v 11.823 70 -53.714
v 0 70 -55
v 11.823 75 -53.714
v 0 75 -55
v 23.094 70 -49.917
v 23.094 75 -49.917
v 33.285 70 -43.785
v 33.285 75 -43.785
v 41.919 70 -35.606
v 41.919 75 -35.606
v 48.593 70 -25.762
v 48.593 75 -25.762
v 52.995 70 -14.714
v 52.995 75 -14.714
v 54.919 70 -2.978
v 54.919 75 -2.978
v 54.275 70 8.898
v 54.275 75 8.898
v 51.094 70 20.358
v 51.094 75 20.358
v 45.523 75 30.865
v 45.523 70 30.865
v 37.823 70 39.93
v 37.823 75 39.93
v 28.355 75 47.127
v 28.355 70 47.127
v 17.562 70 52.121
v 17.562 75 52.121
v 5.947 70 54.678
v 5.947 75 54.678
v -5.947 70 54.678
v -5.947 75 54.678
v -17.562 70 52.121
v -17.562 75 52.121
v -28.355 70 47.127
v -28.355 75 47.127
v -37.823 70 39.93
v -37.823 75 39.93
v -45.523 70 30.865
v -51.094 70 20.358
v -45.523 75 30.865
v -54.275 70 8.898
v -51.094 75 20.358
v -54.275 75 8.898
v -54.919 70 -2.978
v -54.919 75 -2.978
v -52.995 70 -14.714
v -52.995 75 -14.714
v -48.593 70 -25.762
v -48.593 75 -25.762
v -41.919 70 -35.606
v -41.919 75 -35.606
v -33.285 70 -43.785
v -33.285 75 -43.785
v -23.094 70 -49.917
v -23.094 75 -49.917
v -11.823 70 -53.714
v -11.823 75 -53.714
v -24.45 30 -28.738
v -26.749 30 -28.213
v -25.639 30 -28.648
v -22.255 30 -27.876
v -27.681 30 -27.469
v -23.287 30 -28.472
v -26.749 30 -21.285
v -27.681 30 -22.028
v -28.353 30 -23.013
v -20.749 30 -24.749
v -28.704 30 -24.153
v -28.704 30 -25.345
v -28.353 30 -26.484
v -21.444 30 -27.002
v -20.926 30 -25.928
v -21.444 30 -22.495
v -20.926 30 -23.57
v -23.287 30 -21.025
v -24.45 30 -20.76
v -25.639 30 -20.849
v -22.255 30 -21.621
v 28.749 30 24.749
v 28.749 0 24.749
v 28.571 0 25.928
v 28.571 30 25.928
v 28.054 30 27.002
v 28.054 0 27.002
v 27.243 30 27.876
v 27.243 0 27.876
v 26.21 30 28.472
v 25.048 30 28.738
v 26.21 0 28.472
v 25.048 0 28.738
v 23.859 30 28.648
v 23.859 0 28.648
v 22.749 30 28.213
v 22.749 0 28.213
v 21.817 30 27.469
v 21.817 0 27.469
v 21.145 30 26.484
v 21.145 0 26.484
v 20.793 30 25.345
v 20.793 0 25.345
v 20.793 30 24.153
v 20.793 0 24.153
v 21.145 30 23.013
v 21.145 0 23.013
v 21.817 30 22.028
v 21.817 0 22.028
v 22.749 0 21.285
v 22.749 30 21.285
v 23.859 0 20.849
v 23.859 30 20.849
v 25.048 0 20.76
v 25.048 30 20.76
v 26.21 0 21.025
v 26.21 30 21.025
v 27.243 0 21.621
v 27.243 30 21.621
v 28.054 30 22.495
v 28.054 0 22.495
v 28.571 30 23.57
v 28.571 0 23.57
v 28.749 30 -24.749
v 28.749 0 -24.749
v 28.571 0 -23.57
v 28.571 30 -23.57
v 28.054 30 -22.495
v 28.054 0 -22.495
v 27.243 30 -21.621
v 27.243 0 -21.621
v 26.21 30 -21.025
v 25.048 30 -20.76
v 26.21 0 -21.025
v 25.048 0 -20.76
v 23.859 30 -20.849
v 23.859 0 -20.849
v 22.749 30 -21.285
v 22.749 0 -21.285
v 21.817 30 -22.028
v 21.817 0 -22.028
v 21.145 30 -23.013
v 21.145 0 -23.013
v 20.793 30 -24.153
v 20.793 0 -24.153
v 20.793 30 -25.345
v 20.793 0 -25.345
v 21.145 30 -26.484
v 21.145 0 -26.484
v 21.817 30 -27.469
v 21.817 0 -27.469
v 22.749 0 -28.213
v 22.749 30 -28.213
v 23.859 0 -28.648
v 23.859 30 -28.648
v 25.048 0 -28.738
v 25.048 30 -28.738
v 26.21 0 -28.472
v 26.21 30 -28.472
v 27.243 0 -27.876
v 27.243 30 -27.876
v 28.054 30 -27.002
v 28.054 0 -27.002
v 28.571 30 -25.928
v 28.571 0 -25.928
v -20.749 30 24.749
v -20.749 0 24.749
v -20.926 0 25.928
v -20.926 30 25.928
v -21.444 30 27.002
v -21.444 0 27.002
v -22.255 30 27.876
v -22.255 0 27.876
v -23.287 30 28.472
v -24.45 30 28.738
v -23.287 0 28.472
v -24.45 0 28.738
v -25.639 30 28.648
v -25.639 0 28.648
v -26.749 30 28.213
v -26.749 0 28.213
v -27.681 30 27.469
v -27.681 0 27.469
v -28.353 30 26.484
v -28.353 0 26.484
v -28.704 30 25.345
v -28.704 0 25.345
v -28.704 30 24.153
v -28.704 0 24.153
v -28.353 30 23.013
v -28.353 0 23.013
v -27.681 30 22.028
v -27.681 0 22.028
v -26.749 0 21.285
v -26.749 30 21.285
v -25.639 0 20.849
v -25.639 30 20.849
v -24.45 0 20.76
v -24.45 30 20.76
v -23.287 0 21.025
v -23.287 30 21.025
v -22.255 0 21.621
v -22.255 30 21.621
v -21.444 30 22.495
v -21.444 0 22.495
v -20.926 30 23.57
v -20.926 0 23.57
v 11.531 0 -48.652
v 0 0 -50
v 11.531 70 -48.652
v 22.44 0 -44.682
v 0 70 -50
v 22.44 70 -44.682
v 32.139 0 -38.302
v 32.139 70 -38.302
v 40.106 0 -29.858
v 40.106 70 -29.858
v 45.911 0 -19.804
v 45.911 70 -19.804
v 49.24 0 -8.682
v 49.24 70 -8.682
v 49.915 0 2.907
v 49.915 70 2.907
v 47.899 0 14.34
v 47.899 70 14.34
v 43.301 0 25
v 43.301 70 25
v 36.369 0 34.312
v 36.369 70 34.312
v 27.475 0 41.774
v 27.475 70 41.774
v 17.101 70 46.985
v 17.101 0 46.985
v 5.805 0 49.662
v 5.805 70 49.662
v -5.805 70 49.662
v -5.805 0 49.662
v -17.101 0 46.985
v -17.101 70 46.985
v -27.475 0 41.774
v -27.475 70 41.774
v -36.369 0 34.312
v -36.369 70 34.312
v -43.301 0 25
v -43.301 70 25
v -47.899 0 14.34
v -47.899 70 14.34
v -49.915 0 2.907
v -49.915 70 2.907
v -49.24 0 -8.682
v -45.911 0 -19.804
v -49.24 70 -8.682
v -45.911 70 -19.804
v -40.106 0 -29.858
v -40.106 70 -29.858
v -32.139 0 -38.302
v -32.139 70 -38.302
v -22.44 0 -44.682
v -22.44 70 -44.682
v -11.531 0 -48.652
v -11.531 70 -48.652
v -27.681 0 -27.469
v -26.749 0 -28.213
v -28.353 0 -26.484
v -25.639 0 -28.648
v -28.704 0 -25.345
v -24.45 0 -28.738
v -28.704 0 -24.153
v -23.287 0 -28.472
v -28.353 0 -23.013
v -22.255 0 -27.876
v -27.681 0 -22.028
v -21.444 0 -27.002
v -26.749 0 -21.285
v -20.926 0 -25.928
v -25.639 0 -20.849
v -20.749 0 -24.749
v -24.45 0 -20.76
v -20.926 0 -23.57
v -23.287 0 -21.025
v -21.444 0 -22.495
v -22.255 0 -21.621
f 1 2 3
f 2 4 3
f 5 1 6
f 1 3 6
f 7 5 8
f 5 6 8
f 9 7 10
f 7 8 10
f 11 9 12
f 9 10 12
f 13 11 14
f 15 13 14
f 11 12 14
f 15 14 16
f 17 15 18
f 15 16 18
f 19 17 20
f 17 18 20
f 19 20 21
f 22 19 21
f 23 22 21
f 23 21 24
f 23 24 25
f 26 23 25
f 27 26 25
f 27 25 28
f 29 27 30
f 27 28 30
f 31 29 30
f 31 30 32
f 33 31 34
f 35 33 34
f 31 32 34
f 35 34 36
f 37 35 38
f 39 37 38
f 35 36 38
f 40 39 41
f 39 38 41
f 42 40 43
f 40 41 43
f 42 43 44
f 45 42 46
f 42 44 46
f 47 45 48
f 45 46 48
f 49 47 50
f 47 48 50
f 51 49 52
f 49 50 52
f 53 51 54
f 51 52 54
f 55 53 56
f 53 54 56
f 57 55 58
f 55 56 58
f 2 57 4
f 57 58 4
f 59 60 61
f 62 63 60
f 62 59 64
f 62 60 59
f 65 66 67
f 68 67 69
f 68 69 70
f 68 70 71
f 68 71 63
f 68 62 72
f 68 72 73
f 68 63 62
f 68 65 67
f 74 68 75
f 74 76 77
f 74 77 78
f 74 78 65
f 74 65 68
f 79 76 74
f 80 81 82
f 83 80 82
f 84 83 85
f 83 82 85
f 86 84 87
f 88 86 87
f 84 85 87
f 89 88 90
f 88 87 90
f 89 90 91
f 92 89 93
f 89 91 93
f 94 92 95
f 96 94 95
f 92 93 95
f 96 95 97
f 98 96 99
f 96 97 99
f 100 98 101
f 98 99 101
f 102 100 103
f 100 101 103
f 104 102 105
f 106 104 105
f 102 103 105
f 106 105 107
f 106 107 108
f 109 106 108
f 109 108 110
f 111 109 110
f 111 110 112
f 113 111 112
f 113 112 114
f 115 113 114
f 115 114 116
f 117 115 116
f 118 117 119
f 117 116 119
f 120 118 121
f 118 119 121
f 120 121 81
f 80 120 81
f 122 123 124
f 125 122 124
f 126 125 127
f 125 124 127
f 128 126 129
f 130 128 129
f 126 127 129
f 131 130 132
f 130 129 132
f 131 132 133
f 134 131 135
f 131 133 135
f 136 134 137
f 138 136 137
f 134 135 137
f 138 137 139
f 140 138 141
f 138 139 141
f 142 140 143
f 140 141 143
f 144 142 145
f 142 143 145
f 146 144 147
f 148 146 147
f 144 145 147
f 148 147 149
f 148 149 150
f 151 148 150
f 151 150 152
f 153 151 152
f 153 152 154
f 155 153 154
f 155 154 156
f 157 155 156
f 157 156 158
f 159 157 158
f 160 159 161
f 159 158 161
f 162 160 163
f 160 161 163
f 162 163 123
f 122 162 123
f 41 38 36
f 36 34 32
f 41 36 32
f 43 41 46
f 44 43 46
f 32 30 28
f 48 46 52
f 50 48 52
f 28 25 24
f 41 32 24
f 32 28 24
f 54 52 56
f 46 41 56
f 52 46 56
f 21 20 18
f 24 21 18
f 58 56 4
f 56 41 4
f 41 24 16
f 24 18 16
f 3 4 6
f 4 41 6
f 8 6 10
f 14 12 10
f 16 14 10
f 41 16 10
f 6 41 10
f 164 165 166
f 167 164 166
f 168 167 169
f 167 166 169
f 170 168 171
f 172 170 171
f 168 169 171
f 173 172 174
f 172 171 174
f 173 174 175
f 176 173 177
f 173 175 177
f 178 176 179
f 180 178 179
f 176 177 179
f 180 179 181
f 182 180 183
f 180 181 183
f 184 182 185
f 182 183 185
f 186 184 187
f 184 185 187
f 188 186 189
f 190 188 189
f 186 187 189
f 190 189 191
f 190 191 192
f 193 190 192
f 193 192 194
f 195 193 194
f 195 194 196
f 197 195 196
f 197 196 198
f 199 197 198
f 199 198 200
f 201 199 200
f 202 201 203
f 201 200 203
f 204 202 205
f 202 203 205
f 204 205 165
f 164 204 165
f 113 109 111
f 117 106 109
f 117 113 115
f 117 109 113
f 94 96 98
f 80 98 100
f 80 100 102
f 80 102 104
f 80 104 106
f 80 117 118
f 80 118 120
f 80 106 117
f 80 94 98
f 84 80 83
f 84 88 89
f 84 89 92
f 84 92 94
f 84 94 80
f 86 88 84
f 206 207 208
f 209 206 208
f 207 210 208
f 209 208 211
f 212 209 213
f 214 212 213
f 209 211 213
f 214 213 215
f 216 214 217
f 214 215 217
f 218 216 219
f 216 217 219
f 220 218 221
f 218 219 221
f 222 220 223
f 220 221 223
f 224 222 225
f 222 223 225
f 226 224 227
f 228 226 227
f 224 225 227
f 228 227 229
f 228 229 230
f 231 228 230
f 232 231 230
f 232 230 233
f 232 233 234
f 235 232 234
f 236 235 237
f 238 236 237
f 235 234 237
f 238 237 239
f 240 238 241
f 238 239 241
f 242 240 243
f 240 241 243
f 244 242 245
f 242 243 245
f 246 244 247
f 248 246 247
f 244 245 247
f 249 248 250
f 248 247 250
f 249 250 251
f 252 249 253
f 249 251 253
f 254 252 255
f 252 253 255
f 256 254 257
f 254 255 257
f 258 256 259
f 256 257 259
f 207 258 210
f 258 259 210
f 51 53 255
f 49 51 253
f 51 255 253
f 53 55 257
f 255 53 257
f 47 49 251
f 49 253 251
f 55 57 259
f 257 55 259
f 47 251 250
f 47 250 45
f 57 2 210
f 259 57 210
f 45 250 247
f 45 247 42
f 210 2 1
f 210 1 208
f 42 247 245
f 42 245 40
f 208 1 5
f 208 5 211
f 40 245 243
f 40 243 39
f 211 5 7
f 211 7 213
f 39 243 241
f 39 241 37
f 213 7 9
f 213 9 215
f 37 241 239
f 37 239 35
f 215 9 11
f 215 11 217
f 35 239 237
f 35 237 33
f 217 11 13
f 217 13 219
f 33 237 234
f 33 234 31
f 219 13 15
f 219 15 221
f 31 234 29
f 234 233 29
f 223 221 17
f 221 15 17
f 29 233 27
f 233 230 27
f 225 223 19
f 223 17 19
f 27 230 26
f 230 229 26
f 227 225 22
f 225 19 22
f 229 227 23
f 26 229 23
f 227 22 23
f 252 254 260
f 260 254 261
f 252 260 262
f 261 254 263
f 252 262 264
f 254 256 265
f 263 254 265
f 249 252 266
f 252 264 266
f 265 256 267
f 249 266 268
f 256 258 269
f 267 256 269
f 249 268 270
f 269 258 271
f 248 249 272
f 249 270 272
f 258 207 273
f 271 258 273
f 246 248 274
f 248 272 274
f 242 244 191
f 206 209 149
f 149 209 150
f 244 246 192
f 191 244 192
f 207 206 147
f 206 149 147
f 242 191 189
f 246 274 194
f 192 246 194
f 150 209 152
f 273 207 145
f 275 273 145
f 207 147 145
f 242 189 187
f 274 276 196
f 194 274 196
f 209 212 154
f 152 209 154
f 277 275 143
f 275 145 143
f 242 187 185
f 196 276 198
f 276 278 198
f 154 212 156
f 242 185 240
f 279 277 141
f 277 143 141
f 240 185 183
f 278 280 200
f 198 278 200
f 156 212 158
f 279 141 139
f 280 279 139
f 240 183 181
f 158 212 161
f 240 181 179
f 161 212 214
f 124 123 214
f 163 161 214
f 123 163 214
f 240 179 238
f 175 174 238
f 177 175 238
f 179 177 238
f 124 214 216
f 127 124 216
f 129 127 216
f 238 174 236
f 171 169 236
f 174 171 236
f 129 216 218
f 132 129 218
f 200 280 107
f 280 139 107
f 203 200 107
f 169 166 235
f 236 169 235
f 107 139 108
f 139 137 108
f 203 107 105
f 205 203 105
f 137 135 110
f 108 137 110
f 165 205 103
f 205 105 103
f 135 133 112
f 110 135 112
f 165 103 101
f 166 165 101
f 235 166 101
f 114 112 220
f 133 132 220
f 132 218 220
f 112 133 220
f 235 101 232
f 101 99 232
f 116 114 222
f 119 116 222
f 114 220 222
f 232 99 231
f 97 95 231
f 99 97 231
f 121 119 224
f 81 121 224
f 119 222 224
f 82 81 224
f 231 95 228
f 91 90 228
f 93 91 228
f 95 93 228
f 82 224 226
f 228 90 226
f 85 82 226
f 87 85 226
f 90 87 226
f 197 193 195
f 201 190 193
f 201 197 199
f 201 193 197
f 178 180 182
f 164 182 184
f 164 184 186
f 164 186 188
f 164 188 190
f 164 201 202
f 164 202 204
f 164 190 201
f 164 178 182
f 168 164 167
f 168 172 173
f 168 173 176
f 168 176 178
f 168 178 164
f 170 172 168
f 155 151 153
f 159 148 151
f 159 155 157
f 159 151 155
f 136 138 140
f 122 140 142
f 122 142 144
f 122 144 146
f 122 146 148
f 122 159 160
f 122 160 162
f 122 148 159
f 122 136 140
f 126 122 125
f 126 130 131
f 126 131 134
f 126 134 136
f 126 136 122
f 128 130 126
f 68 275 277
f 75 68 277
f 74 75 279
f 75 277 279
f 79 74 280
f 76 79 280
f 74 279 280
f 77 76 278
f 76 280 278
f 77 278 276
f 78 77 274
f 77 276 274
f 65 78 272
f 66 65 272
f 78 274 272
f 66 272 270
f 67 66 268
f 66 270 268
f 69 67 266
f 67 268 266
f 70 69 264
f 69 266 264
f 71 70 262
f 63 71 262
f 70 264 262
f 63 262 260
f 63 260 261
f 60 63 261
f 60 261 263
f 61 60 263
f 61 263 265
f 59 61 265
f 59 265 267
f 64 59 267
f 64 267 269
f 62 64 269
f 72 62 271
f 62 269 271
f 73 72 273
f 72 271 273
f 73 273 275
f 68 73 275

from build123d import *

# Parameters (mm, degrees)
SKETCH2_R          = 4
CUT_EXTRUDE1_DEPTH = 30


with BuildPart() as part:
    # Sketch1 → Revolve1 (revolve)
    with BuildSketch(Plane(origin=(0, 0, 0), x_dir=(0, 0, -1), z_dir=(1, 0, 0))):
        Polygon((0, 0), (50, 0), (50, 70), (55, 70), (55, 75), (0, 75), align=None)
    revolve(axis=Axis((0, 75, 0), (0, -1, 0)))

    # Sketch2 → Cut-Extrude1 (cut)
    with BuildSketch(Plane.XZ):
        with Locations((-24.748737342, 24.748737342)):
            Circle(SKETCH2_R)
        with Locations((24.748737342, 24.748737342)):
            Circle(SKETCH2_R)
        with Locations((24.748737342, -24.748737342)):
            Circle(SKETCH2_R)
        with Locations((-24.748737342, -24.748737342)):
            Circle(SKETCH2_R)
    extrude(amount=-CUT_EXTRUDE1_DEPTH, mode=Mode.SUBTRACT)


solid = part.part
